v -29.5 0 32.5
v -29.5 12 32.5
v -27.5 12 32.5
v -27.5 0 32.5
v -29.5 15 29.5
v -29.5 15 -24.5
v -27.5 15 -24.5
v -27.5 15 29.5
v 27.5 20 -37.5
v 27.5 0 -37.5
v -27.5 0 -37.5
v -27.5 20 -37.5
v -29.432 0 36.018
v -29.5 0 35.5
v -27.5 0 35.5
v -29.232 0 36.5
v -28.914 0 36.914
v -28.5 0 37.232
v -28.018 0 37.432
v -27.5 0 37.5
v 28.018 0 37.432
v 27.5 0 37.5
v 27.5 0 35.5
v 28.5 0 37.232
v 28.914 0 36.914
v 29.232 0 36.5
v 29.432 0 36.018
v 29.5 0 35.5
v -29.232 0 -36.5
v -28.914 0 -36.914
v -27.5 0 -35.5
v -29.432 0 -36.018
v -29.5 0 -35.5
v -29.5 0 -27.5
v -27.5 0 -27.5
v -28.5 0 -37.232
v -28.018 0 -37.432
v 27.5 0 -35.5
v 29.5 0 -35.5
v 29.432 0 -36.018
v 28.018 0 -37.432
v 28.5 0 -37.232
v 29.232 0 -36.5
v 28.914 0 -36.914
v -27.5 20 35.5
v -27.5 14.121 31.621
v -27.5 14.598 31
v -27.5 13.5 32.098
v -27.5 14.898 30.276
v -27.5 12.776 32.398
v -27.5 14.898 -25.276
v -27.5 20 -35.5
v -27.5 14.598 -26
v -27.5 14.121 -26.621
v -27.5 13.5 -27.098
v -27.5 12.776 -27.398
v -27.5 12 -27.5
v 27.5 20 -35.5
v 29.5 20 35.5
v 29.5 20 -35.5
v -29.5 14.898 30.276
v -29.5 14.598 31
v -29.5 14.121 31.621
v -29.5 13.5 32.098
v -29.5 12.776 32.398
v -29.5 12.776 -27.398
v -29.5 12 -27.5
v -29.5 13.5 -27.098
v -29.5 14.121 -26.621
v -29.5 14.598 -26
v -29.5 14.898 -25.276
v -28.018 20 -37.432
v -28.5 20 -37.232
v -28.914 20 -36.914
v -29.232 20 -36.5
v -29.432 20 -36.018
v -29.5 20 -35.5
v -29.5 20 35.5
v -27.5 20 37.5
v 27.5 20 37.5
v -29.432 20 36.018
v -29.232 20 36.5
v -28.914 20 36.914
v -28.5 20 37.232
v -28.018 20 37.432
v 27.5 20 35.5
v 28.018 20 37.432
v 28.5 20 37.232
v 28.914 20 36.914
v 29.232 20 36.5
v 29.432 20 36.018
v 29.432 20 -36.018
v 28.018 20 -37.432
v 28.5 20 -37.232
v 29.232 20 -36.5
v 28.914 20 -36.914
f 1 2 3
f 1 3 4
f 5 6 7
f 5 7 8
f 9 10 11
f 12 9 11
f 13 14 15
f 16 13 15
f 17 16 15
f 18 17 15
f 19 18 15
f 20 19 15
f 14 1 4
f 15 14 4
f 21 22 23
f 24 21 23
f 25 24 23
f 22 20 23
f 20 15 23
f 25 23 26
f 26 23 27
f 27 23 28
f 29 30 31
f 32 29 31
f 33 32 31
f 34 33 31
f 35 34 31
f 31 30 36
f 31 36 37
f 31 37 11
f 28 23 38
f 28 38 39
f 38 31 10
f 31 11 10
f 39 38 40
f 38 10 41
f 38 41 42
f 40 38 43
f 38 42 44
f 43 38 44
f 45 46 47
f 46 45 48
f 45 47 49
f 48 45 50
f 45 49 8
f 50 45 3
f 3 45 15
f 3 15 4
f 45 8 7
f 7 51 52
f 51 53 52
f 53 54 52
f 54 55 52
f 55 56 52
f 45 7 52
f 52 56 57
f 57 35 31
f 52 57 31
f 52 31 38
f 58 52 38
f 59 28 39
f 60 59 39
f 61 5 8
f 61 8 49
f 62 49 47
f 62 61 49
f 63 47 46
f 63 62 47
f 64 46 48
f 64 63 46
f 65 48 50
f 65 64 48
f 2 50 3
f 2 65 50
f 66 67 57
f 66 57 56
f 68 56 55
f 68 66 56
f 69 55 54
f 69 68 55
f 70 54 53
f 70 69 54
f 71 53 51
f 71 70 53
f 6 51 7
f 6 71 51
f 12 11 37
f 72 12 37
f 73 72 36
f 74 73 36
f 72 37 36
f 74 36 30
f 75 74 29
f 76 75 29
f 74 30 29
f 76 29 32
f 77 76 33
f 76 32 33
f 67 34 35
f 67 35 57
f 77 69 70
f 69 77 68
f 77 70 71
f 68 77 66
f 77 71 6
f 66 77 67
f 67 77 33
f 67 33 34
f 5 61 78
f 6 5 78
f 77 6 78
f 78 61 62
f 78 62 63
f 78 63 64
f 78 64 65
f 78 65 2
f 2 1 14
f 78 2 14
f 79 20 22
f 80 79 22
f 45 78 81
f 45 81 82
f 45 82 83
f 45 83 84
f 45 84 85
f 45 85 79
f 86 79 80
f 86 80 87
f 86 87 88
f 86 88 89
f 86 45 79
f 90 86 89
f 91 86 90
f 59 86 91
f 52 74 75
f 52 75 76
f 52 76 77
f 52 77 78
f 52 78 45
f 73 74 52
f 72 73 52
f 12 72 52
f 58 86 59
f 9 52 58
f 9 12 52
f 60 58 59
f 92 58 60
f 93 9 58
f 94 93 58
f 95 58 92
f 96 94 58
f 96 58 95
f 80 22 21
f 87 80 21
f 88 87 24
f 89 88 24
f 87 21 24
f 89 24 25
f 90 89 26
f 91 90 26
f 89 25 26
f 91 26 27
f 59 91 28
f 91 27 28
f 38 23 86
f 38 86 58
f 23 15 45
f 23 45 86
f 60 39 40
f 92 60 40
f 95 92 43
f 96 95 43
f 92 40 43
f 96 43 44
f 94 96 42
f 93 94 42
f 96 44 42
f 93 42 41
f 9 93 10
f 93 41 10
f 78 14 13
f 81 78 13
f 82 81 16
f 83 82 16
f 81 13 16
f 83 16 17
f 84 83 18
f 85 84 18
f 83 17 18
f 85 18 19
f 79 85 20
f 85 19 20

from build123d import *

# Parameters (mm, degrees)
SKETCH1_W           = 55
SKETCH1_H           = 71
BOSS_EXTRUDE1_DEPTH = 20
CUT_EXTRUDE1_DEPTH  = 20


with BuildPart() as part:
    # Sketch1 → Boss-Extrude1 (new body)
    with BuildSketch(Plane(origin=(0, 0, 0), x_dir=(1, 0, 0), z_dir=(0, 1, 0))):
        with BuildLine():
            Line((29.5, -35.5), (29.5, 35.5))
            ThreePointArc((29.5, 35.5), (28.914213562, 36.914213562), (27.5, 37.5))
            Line((27.5, 37.5), (-27.5, 37.5))
            ThreePointArc((-27.5, 37.5), (-28.914213562, 36.914213562), (-29.5, 35.5))
            Line((-29.5, 35.5), (-29.5, -35.5))
            ThreePointArc((-29.5, -35.5), (-28.914213562, -36.914213562), (-27.5, -37.5))
            Line((-27.5, -37.5), (27.5, -37.5))
            ThreePointArc((27.5, -37.5), (28.914213562, -36.914213562), (29.5, -35.5))
        make_face()
        Rectangle(SKETCH1_W, SKETCH1_H, mode=Mode.SUBTRACT)
    extrude(amount=BOSS_EXTRUDE1_DEPTH)

    # Sketch2 → Cut-Extrude1 (cut)
    with BuildSketch(Plane.ZY.offset(29.5)):
        with BuildLine():
            Line((-24.5, 15), (29.5, 15))
            ThreePointArc((29.5, 15), (31.621320344, 14.121320344), (32.5, 12))
            Line((32.5, 12), (32.5, -3))
            Line((32.5, -3), (-27.5, -3))
            Line((-27.5, -3), (-27.5, 12))
            ThreePointArc((-27.5, 12), (-26.621320344, 14.121320344), (-24.5, 15))
        make_face()
    extrude(amount=-CUT_EXTRUDE1_DEPTH, mode=Mode.SUBTRACT)


solid = part.part
